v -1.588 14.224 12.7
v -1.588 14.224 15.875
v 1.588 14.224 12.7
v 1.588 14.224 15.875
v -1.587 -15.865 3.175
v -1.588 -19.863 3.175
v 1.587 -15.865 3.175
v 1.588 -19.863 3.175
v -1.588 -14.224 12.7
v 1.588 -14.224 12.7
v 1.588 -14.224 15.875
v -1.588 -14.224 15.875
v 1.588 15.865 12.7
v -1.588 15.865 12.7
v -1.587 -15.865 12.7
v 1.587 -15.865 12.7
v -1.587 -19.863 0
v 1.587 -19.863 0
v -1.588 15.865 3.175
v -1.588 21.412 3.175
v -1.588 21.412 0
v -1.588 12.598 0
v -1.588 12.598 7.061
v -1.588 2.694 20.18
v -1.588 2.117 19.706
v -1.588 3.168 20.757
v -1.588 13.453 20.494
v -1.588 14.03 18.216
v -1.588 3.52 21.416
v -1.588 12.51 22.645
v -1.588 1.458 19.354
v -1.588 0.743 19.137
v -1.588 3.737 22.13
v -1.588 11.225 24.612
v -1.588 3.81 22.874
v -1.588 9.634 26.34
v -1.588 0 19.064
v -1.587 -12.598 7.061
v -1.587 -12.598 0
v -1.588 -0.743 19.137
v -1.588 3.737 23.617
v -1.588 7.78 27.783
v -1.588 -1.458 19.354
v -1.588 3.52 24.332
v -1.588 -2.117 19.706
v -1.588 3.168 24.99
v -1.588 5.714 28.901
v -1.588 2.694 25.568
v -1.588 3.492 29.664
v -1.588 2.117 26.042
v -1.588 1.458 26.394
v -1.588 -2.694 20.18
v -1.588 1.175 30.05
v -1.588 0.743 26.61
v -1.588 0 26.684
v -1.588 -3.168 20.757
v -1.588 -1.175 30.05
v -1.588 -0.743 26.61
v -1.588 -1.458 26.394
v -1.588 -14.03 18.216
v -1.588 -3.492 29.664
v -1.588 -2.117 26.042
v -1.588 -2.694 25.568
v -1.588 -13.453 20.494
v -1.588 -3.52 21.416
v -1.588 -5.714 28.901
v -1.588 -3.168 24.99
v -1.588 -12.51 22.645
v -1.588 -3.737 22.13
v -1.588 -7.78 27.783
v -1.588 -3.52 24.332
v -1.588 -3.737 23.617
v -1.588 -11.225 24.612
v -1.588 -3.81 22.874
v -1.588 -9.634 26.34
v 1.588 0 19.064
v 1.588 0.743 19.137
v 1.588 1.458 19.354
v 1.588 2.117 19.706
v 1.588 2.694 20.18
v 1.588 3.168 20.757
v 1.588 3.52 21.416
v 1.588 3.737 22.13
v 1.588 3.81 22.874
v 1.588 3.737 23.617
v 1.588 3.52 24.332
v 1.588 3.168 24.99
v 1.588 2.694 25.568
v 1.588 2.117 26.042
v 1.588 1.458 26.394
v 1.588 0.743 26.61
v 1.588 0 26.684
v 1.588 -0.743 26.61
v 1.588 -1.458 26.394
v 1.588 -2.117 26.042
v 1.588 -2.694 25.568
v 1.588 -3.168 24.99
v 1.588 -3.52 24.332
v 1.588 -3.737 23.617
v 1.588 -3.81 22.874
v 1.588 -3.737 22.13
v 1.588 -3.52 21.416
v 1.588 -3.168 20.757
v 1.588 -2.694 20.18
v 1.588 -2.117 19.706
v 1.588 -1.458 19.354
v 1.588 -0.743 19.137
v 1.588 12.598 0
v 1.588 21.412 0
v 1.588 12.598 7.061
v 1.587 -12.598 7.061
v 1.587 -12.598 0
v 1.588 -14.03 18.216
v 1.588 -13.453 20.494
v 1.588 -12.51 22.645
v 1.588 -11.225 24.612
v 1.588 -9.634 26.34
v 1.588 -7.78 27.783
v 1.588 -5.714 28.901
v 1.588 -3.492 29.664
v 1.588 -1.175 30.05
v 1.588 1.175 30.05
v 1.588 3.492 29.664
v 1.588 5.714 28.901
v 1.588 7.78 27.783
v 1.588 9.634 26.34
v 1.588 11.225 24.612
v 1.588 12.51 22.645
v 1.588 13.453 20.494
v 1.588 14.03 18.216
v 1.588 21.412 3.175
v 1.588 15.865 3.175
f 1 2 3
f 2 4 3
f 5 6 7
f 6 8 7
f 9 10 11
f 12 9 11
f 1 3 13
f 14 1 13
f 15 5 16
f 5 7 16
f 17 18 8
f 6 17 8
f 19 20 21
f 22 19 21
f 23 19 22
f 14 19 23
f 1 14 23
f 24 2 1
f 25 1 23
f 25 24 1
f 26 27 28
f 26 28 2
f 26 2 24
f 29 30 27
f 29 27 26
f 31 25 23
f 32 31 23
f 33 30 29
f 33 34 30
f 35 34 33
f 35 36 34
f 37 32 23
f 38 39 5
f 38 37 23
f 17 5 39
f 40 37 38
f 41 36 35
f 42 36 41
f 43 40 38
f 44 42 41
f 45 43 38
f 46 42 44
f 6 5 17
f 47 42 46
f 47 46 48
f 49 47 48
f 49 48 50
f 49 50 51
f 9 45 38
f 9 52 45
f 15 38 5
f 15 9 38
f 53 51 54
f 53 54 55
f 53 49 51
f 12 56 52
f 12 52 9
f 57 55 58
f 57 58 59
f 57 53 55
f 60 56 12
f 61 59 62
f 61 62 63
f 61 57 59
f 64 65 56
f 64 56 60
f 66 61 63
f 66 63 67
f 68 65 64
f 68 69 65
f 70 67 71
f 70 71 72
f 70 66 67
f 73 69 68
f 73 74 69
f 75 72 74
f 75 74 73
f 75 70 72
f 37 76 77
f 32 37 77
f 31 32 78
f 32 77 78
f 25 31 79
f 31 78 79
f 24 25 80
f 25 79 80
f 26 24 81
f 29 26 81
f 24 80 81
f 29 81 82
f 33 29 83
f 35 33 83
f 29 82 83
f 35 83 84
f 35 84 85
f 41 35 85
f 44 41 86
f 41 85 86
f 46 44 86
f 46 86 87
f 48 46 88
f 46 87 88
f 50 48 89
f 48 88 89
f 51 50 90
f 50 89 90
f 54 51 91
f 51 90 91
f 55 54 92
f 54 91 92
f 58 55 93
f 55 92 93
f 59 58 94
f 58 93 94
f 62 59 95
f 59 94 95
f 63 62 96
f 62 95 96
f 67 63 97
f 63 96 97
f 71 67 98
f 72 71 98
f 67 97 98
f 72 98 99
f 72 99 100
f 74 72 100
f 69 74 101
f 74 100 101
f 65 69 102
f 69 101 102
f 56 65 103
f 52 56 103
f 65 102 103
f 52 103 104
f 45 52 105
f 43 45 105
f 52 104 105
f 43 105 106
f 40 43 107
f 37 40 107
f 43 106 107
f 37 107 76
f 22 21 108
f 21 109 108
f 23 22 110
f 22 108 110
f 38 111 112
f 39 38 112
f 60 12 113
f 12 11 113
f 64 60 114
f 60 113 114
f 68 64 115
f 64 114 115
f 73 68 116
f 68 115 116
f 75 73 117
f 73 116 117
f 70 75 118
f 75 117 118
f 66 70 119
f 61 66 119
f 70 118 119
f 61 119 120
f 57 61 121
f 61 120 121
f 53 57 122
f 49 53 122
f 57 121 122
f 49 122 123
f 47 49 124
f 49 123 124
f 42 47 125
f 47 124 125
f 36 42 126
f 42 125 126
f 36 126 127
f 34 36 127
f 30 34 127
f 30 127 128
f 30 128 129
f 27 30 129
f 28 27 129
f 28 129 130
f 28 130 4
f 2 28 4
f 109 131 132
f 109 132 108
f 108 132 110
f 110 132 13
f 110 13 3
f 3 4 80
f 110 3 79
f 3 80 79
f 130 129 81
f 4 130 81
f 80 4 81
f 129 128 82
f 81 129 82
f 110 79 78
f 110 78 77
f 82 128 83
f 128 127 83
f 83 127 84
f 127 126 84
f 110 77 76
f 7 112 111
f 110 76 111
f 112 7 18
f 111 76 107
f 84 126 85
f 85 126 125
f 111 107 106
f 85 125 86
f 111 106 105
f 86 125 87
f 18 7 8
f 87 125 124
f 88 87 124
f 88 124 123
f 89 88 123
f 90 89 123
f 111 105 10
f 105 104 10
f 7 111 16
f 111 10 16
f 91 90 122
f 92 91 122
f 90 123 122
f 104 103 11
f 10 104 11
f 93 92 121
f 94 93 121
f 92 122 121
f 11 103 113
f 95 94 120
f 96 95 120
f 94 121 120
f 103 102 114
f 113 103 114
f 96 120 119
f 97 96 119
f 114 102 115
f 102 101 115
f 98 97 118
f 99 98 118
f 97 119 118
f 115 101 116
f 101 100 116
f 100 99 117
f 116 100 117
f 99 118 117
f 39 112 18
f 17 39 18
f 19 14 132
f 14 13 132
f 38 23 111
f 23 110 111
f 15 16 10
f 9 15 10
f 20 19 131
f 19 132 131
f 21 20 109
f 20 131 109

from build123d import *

# Parameters (mm, degrees)
BOSS_EXTRUDE1_DEPTH = 1.5875
BOSS_EXTRUDE2_DEPTH = 1.5875
SKETCH5_R           = 3.81
CUT_EXTRUDE1_DEPTH  = 3.175


with BuildPart() as part:
    # Sketch3 → Boss-Extrude1 (new, symmetric)
    with BuildSketch(Plane.YZ):
        Polygon((-19.8628, 0), (-19.8628, 3.175), (-15.86484, 3.175), (-15.86484, 12.7), (15.86484, 12.7), (15.86484, 3.175), (21.4122, 3.175), (21.4122, 0), (12.5984, 0), (12.5984, 7.0612), (-12.5984, 7.0612), (-12.5984, 0), align=None)
    extrude(amount=BOSS_EXTRUDE1_DEPTH, both=True)

    # Sketch4 → Boss-Extrude2 (add, symmetric)
    with BuildSketch(Plane.YZ):
        with BuildLine():
            Line((-14.224, 12.7), (-14.224, 15.875))
            ThreePointArc((-14.224, 15.875), (0, 30.099), (14.224, 15.875))
            Line((14.224, 15.875), (14.224, 12.7))
            Line((14.224, 12.7), (15.86484, 12.7))
            Line((15.86484, 12.7), (15.86484, 3.175))
            Line((15.86484, 3.175), (21.4122, 3.175))
            Line((21.4122, 3.175), (21.4122, 0))
            Line((21.4122, 0), (12.5984, 0))
            Line((12.5984, 0), (12.5984, 7.0612))
            Line((12.5984, 7.0612), (-12.5984, 7.0612))
            Line((-12.5984, 7.0612), (-12.5984, 0))
            Line((-12.5984, 0), (-19.8628, 0))
            Line((-19.8628, 0), (-19.8628, 3.175))
            Line((-19.8628, 3.175), (-15.86484, 3.175))
            Line((-15.86484, 3.175), (-15.86484, 12.7))
            Line((-15.86484, 12.7), (-14.224, 12.7))
        make_face()
    extrude(amount=BOSS_EXTRUDE2_DEPTH, both=True)

    # Sketch5 → Cut-Extrude1 (cut)
    with BuildSketch(Plane.YZ.offset(1.5875)):
        with Locations(Location((0, 22.873624204, 0), (0, 0, 270))):
            Circle(SKETCH5_R)
    extrude(amount=-CUT_EXTRUDE1_DEPTH, mode=Mode.SUBTRACT)


solid = part.part
